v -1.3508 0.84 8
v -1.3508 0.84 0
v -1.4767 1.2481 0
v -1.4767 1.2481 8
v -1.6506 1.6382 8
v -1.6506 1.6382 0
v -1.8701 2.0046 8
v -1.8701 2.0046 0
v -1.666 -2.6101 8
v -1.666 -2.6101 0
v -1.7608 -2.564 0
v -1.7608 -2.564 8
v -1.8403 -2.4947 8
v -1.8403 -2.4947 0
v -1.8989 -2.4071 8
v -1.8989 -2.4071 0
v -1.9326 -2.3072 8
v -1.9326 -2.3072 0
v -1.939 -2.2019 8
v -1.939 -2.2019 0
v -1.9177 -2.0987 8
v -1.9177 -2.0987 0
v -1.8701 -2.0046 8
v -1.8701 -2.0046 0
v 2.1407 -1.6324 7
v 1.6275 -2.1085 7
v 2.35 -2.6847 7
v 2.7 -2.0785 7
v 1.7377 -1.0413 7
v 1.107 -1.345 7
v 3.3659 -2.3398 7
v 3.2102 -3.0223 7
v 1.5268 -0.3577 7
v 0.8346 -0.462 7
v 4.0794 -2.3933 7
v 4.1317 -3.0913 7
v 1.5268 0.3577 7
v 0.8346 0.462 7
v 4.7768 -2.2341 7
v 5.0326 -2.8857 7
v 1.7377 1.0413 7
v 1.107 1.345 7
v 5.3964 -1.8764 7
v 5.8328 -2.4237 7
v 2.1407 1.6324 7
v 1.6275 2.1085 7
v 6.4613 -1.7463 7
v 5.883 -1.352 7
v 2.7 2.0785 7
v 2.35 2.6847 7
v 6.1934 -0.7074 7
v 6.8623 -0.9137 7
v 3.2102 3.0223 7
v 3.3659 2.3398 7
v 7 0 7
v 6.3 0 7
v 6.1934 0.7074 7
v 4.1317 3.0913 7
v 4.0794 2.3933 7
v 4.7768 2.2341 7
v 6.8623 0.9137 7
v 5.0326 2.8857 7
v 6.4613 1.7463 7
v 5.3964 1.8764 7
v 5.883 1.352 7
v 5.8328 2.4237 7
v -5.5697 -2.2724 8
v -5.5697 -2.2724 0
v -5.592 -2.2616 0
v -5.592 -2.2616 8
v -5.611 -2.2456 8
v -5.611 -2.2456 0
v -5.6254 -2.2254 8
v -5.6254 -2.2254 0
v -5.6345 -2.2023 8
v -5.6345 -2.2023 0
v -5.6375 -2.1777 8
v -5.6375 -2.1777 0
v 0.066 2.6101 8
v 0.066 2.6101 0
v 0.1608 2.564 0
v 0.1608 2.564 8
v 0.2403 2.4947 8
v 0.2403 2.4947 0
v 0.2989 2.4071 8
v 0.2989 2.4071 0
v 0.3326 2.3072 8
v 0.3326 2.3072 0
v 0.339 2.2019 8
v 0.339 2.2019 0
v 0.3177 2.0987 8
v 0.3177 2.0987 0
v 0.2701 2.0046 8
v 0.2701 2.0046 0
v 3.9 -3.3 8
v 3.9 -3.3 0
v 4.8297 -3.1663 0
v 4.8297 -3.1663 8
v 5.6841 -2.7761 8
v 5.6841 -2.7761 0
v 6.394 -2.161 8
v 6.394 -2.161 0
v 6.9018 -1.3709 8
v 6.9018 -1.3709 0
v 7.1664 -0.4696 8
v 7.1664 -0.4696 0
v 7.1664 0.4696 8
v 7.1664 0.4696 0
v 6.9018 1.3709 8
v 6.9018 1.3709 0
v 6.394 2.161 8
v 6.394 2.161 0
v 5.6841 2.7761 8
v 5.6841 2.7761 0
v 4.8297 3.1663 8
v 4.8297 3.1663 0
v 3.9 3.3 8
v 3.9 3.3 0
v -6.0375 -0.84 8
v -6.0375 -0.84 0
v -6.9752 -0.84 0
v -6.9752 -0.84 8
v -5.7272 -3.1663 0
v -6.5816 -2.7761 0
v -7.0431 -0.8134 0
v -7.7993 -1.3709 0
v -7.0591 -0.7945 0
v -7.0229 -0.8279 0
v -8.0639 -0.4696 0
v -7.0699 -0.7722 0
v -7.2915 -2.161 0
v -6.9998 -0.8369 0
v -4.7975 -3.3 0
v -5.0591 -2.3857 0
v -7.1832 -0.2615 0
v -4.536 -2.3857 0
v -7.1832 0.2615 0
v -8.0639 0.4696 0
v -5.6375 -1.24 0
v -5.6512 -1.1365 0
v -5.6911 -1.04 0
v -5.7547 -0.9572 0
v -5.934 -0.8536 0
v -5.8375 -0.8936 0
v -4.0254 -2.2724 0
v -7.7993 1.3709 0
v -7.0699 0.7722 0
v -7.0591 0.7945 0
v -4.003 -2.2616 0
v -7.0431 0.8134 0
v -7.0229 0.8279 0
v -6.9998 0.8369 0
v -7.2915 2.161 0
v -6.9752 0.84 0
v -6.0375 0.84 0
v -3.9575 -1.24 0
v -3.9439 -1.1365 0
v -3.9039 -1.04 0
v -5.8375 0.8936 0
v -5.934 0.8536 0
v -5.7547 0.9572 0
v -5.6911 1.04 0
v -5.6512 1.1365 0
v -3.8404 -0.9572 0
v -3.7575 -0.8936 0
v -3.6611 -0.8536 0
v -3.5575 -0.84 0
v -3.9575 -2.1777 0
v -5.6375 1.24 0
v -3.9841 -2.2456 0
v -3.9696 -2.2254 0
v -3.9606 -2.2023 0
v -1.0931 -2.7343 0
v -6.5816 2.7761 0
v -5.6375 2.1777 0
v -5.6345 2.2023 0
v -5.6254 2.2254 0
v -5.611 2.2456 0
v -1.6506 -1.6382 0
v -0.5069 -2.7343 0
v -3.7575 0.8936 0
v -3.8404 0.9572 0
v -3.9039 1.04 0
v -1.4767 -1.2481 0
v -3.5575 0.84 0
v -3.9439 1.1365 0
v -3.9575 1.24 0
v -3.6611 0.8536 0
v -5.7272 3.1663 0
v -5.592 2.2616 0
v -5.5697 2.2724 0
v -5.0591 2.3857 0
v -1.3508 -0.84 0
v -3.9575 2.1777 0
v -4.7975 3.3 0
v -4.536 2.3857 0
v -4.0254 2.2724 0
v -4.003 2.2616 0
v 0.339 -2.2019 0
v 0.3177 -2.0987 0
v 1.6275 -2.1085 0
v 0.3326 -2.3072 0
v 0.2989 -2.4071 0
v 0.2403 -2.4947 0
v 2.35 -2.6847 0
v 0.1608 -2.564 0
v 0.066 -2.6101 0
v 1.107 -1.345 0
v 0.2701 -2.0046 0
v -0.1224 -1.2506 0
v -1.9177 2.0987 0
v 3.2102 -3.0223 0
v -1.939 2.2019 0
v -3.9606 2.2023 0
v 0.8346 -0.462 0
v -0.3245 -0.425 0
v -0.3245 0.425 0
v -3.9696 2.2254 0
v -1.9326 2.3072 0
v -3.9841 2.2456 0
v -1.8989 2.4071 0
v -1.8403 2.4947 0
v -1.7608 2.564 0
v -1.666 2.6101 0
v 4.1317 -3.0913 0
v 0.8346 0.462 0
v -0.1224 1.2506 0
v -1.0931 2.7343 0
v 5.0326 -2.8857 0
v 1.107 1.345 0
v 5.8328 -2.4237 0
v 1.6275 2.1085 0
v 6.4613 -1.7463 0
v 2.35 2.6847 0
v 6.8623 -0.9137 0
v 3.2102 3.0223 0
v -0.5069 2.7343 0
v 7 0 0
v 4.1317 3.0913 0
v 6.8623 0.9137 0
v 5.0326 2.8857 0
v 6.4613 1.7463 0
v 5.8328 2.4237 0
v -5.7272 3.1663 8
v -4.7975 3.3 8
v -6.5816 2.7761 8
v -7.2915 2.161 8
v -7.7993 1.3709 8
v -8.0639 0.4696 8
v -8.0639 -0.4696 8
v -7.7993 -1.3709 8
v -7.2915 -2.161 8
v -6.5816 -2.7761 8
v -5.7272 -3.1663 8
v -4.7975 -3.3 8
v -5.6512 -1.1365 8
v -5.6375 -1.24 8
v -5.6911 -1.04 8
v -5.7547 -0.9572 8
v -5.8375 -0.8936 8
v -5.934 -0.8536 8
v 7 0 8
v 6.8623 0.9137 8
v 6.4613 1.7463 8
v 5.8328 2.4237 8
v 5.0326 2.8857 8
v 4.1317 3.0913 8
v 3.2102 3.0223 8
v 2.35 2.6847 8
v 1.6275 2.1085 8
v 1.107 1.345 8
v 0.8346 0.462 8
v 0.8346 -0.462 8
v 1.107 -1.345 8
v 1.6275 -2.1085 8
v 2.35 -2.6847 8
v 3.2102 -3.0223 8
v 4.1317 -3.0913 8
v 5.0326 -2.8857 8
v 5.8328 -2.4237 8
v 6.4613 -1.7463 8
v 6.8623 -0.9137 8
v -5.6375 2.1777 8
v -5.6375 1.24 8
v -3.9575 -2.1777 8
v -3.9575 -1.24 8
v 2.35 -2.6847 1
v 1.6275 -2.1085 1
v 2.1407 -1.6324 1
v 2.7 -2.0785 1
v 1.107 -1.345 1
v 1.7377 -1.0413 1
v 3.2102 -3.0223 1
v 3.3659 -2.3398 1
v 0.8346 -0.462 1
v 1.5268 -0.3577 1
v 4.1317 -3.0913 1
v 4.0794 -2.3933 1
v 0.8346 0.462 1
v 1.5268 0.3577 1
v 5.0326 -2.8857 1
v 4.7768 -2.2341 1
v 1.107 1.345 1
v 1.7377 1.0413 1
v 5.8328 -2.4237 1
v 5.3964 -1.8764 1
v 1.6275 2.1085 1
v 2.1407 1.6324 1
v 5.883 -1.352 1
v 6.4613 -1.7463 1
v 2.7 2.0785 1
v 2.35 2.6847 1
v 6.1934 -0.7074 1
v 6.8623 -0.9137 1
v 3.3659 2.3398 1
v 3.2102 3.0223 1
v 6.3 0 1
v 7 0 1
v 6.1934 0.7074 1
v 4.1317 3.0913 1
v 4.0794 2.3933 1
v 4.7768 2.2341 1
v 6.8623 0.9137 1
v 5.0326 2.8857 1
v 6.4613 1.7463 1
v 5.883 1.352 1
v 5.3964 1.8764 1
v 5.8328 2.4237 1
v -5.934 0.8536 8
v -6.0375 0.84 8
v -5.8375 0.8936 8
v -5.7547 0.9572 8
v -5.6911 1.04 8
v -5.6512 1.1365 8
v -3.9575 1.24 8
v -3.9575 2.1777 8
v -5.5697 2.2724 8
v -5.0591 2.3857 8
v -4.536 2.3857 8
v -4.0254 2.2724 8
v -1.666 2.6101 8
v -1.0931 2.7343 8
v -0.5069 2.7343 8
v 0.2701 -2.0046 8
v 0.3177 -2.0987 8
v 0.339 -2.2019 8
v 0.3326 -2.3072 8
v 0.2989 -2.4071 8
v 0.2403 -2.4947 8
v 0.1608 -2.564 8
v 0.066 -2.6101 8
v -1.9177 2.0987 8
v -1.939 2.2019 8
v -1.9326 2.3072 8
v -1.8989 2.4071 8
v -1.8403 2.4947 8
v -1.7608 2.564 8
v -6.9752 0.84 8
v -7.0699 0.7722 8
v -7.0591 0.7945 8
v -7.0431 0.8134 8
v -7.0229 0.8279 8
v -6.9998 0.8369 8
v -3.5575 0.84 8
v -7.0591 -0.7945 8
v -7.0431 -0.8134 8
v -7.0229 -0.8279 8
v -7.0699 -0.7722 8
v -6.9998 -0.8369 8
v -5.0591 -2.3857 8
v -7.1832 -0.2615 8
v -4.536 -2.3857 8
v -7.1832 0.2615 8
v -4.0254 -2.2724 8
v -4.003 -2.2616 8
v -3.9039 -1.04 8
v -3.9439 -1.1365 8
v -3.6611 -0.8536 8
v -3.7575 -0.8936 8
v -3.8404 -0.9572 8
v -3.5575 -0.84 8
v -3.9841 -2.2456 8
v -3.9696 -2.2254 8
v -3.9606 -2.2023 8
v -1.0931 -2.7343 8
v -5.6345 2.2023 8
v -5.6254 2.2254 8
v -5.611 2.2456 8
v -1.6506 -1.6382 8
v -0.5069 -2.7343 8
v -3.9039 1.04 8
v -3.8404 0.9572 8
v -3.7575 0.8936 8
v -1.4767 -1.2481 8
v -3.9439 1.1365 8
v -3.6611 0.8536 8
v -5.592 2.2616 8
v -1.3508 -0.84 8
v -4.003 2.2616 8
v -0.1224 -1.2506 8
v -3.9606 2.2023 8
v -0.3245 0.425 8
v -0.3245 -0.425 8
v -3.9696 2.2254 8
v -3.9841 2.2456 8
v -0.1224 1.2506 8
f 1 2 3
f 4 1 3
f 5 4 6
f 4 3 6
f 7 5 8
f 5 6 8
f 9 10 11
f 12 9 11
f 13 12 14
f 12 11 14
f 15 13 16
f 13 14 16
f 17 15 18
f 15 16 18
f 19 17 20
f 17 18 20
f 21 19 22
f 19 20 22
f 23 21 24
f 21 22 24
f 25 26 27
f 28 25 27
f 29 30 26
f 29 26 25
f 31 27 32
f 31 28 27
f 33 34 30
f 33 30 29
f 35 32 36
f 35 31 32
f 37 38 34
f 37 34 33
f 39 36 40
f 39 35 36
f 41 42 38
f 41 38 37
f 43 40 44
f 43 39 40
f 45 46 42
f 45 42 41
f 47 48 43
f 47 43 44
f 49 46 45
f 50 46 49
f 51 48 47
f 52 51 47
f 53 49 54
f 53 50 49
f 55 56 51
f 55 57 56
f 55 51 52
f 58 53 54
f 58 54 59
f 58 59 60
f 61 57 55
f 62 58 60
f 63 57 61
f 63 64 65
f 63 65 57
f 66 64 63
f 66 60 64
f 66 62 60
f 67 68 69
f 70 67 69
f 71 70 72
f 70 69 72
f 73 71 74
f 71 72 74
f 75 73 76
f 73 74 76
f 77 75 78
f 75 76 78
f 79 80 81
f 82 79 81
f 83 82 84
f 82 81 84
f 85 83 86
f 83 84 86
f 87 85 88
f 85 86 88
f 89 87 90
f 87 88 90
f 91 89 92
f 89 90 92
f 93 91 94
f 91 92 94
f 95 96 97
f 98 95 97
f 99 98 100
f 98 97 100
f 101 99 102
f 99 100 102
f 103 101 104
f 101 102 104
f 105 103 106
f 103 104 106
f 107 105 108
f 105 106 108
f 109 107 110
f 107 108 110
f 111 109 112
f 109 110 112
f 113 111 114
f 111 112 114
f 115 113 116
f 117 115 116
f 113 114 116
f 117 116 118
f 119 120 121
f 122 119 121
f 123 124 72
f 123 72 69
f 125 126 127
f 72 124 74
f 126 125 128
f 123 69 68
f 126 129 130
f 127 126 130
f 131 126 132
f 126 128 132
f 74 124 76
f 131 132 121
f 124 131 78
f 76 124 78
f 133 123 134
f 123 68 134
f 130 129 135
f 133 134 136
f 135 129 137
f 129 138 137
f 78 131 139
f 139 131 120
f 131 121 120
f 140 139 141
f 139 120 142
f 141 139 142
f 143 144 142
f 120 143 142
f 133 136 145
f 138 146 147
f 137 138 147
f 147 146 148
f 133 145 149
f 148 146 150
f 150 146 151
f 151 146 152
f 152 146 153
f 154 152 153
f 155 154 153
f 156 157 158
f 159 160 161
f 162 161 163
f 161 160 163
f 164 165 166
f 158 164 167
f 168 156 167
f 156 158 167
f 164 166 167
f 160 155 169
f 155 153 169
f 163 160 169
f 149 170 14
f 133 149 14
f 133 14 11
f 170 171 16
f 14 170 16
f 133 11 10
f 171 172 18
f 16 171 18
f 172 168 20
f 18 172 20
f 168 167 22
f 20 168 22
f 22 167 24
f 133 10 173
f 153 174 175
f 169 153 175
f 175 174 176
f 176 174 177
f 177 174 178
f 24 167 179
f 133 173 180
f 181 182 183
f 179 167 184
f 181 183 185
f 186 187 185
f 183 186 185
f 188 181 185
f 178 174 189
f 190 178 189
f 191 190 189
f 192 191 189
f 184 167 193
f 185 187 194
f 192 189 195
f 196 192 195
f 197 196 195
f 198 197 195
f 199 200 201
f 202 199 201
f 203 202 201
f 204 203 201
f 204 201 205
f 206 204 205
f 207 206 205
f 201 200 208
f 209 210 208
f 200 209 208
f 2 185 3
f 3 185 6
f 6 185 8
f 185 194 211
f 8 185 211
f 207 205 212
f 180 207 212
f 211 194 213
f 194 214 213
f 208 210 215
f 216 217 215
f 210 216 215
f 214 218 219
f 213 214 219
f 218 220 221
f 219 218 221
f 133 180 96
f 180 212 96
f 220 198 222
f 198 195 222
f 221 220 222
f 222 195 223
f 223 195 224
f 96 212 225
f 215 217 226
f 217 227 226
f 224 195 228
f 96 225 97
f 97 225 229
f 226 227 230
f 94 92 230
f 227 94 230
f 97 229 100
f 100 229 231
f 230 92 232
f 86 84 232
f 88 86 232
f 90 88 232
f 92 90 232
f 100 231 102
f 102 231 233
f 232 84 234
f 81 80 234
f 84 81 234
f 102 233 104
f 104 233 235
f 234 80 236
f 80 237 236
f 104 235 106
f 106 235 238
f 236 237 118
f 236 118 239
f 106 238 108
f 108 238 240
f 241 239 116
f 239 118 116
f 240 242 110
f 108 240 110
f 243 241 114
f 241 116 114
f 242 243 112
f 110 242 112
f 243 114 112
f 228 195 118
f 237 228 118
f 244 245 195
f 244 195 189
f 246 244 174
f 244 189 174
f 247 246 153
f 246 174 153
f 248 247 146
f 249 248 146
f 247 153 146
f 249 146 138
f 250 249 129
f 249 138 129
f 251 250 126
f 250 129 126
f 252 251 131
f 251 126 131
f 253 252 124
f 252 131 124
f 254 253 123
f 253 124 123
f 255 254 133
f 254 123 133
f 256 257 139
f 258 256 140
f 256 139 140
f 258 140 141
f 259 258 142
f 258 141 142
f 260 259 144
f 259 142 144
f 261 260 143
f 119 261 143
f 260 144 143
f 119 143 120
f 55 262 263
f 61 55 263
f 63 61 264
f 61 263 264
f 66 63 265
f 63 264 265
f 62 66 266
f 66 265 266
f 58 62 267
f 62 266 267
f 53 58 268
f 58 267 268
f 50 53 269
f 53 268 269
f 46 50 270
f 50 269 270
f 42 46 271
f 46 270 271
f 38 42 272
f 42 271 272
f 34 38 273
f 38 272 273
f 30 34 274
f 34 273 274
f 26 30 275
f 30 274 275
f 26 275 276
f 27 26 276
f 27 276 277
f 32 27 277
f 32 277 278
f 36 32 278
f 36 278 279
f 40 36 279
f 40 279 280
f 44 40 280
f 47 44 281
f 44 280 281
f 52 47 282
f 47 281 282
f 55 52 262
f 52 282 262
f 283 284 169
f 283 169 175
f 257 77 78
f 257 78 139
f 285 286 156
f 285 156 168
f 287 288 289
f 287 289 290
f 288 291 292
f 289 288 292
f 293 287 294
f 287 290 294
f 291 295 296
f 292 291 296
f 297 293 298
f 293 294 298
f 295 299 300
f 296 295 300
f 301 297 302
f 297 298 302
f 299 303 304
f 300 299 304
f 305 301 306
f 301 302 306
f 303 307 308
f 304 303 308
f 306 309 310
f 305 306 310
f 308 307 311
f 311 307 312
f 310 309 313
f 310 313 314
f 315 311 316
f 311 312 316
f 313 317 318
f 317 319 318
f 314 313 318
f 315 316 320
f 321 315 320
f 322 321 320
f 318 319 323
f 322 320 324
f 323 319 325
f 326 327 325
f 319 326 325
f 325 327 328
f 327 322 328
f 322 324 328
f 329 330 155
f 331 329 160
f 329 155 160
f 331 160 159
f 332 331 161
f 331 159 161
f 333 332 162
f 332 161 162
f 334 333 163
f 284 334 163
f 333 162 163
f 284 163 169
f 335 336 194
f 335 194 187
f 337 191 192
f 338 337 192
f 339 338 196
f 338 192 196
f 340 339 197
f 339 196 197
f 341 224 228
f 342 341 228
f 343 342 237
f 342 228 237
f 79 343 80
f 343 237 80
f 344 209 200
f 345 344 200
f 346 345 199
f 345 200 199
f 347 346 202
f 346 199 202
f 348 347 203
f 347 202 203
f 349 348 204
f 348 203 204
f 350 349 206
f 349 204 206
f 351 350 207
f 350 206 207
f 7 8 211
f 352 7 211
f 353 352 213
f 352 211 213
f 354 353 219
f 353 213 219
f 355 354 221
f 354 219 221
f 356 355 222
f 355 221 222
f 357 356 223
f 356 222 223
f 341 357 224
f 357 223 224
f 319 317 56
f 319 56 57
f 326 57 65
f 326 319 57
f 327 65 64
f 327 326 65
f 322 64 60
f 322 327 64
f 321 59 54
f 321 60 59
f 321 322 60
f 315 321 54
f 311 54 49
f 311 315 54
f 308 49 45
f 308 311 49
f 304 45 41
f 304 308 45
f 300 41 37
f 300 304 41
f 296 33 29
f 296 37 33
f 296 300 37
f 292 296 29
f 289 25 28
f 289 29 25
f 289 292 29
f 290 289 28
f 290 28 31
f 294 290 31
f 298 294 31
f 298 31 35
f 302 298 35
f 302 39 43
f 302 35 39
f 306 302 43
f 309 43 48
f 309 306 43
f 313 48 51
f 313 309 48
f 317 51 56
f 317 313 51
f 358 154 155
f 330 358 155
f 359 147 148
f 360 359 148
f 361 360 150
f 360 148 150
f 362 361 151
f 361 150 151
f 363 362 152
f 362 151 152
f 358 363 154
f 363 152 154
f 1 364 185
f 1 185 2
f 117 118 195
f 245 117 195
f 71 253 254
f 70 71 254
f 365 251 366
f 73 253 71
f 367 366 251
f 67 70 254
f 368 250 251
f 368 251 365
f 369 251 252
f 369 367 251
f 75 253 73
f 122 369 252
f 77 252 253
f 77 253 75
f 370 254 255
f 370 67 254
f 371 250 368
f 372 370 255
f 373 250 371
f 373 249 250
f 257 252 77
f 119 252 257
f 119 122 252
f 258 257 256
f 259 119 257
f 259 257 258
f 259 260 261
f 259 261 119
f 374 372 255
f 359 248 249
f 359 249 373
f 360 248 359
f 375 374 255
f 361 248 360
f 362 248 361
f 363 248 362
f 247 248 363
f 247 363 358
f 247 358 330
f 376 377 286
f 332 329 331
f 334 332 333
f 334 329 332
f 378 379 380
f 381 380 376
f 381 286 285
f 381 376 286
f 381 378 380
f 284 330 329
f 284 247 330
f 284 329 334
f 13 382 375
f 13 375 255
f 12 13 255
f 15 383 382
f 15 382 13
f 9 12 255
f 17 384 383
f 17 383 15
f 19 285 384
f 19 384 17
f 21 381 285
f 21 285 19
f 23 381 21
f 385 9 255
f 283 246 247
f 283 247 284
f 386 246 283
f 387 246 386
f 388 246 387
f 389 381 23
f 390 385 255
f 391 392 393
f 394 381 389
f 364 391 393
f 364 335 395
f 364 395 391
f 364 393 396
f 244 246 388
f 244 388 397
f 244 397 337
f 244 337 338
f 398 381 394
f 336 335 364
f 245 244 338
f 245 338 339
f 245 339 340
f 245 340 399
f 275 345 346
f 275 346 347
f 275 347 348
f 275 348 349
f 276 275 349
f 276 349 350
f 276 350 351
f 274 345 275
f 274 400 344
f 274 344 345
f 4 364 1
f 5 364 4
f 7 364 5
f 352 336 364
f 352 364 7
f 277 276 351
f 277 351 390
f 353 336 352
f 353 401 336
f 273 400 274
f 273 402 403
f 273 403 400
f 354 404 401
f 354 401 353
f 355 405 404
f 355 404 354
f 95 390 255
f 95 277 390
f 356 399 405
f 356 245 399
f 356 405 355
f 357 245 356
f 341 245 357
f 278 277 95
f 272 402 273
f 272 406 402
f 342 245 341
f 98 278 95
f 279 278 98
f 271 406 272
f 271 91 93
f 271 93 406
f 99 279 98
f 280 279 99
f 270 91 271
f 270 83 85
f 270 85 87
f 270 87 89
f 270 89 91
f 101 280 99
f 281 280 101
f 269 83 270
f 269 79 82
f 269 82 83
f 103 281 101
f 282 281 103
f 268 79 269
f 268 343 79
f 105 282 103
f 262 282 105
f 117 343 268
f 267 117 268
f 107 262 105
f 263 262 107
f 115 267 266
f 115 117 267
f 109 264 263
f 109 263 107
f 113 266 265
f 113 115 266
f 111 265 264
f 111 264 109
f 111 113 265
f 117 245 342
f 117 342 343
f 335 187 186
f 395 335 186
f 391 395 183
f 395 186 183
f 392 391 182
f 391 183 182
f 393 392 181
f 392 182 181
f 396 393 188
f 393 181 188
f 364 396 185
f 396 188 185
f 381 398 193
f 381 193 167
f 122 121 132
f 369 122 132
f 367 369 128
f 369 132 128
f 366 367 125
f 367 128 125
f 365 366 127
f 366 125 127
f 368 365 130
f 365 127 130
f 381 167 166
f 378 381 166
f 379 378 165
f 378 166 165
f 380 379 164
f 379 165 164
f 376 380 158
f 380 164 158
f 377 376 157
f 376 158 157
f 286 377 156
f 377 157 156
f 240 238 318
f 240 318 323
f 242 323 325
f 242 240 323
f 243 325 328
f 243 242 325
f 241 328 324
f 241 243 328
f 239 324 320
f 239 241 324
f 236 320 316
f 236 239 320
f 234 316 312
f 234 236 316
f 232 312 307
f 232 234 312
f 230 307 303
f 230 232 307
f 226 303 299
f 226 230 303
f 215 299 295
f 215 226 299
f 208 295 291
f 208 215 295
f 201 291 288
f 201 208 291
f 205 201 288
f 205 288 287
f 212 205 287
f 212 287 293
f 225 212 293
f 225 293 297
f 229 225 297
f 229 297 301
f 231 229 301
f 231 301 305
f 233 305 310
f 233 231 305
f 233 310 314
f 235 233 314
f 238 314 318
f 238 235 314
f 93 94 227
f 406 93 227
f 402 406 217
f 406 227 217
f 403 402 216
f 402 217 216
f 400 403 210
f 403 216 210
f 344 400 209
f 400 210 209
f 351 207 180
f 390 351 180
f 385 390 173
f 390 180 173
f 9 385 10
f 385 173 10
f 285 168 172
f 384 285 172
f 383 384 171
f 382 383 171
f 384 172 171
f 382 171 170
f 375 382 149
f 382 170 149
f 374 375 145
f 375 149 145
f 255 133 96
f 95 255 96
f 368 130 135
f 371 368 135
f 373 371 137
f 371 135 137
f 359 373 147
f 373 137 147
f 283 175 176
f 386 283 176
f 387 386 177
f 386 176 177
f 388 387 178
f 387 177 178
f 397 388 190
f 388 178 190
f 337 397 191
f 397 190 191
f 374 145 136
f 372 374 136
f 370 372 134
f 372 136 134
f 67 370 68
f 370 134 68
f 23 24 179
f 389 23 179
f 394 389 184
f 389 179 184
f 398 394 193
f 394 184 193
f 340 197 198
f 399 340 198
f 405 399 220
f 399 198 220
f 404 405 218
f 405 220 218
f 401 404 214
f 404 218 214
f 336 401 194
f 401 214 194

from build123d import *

# Parameters (mm, degrees)
SKETCH2_R           = 2.4
BOSS_EXTRUDE1_DEPTH = 8
SKETCH3_R           = 3.1
CUT_EXTRUDE1_DEPTH  = 1


with BuildPart() as part:
    # Sketch2 → Boss-Extrude1 (new body)
    with BuildSketch(Plane.XY):
        with BuildLine():
            Line((3.9, 3.3), (-4.797530266, 3.3))
            ThreePointArc((-4.797530266, 3.3), (-8.097530266, 0), (-4.797530266, -3.3))
            Line((-4.797530266, -3.3), (3.9, -3.3))
            ThreePointArc((3.9, -3.3), (7.2, 0), (3.9, 3.3))
        make_face()
        with Locations((3.9, 0)):
            Circle(SKETCH2_R, mode=Mode.SUBTRACT)
        with BuildLine():
            Line((-6.975235481, 0.84), (-6.037530266, 0.84))
            ThreePointArc((-6.037530266, 0.84), (-5.754687554, 0.957157288), (-5.637530266, 1.24))
            Line((-5.637530266, 1.24), (-5.637530266, 2.177705214))
            ThreePointArc((-5.637530266, 2.177705214), (-5.618824151, 2.235940121), (-5.56970418, 2.27238805))
            ThreePointArc((-5.56970418, 2.27238805), (-4.797530266, 2.4), (-4.025356353, 2.27238805))
            ThreePointArc((-4.025356353, 2.27238805), (-3.976236382, 2.235940121), (-3.957530266, 2.177705214))
            Line((-3.957530266, 2.177705214), (-3.957530266, 1.24))
            ThreePointArc((-3.957530266, 1.24), (-3.840372979, 0.957157288), (-3.557530266, 0.84))
            Line((-3.557530266, 0.84), (-2.619825052, 0.84))
            Line((-2.619825052, 0.84), (-2.549330987, 0.84))
            Line((-2.549330987, 0.84), (-1.35081169, 0.84))
            ThreePointArc((-1.35081169, 0.84), (-1.557752494, 1.445797742), (-1.870126582, 2.004580194))
            ThreePointArc((-1.870126582, 2.004580194), (-1.919033599, 2.358251088), (-1.665957447, 2.610099174))
            ThreePointArc((-1.665957447, 2.610099174), (-0.8, 2.75), (0.065957447, 2.610099174))
            ThreePointArc((0.065957447, 2.610099174), (0.319033599, 2.358251088), (0.270126582, 2.004580194))
            ThreePointArc((0.270126582, 2.004580194), (-0.35, 0), (0.270126582, -2.004580194))
            ThreePointArc((0.270126582, -2.004580194), (0.319033599, -2.358251088), (0.065957447, -2.610099174))
            ThreePointArc((0.065957447, -2.610099174), (-0.8, -2.75), (-1.665957447, -2.610099174))
            ThreePointArc((-1.665957447, -2.610099174), (-1.919033599, -2.358251088), (-1.870126582, -2.004580194))
            ThreePointArc((-1.870126582, -2.004580194), (-1.557752494, -1.445797742), (-1.35081169, -0.84))
            Line((-1.35081169, -0.84), (-2.549330987, -0.84))
            Line((-2.549330987, -0.84), (-2.619825052, -0.84))
            Line((-2.619825052, -0.84), (-3.557530266, -0.84))
            ThreePointArc((-3.557530266, -0.84), (-3.840372979, -0.957157288), (-3.957530266, -1.24))
            Line((-3.957530266, -1.24), (-3.957530266, -2.177705214))
            ThreePointArc((-3.957530266, -2.177705214), (-3.976236382, -2.235940121), (-4.025356353, -2.27238805))
            ThreePointArc((-4.025356353, -2.27238805), (-4.797530266, -2.4), (-5.56970418, -2.27238805))
            ThreePointArc((-5.56970418, -2.27238805), (-5.618824151, -2.235940121), (-5.637530266, -2.177705214))
            Line((-5.637530266, -2.177705214), (-5.637530266, -1.24))
            ThreePointArc((-5.637530266, -1.24), (-5.754687554, -0.957157288), (-6.037530266, -0.84))
            Line((-6.037530266, -0.84), (-6.975235481, -0.84))
            ThreePointArc((-6.975235481, -0.84), (-7.033470387, -0.821293884), (-7.069918316, -0.772173913))
            ThreePointArc((-7.069918316, -0.772173913), (-7.197530266, 0), (-7.069918316, 0.772173913))
            ThreePointArc((-7.069918316, 0.772173913), (-7.033470387, 0.821293884), (-6.975235481, 0.84))
        make_face(mode=Mode.SUBTRACT)
    extrude(amount=BOSS_EXTRUDE1_DEPTH)

    # Sketch3 → Cut-Extrude1 (cut)
    with BuildSketch(Plane.XY.offset(8)):
        with Locations((3.9, 0)):
            Circle(SKETCH3_R)
    cut_extrude1 = extrude(amount=-CUT_EXTRUDE1_DEPTH, mode=Mode.SUBTRACT)

    # Mirror1: Cut-Extrude1 across plane
    add(cut_extrude1.mirror(Plane.XY.offset(4)), mode=Mode.SUBTRACT)


solid = part.part
